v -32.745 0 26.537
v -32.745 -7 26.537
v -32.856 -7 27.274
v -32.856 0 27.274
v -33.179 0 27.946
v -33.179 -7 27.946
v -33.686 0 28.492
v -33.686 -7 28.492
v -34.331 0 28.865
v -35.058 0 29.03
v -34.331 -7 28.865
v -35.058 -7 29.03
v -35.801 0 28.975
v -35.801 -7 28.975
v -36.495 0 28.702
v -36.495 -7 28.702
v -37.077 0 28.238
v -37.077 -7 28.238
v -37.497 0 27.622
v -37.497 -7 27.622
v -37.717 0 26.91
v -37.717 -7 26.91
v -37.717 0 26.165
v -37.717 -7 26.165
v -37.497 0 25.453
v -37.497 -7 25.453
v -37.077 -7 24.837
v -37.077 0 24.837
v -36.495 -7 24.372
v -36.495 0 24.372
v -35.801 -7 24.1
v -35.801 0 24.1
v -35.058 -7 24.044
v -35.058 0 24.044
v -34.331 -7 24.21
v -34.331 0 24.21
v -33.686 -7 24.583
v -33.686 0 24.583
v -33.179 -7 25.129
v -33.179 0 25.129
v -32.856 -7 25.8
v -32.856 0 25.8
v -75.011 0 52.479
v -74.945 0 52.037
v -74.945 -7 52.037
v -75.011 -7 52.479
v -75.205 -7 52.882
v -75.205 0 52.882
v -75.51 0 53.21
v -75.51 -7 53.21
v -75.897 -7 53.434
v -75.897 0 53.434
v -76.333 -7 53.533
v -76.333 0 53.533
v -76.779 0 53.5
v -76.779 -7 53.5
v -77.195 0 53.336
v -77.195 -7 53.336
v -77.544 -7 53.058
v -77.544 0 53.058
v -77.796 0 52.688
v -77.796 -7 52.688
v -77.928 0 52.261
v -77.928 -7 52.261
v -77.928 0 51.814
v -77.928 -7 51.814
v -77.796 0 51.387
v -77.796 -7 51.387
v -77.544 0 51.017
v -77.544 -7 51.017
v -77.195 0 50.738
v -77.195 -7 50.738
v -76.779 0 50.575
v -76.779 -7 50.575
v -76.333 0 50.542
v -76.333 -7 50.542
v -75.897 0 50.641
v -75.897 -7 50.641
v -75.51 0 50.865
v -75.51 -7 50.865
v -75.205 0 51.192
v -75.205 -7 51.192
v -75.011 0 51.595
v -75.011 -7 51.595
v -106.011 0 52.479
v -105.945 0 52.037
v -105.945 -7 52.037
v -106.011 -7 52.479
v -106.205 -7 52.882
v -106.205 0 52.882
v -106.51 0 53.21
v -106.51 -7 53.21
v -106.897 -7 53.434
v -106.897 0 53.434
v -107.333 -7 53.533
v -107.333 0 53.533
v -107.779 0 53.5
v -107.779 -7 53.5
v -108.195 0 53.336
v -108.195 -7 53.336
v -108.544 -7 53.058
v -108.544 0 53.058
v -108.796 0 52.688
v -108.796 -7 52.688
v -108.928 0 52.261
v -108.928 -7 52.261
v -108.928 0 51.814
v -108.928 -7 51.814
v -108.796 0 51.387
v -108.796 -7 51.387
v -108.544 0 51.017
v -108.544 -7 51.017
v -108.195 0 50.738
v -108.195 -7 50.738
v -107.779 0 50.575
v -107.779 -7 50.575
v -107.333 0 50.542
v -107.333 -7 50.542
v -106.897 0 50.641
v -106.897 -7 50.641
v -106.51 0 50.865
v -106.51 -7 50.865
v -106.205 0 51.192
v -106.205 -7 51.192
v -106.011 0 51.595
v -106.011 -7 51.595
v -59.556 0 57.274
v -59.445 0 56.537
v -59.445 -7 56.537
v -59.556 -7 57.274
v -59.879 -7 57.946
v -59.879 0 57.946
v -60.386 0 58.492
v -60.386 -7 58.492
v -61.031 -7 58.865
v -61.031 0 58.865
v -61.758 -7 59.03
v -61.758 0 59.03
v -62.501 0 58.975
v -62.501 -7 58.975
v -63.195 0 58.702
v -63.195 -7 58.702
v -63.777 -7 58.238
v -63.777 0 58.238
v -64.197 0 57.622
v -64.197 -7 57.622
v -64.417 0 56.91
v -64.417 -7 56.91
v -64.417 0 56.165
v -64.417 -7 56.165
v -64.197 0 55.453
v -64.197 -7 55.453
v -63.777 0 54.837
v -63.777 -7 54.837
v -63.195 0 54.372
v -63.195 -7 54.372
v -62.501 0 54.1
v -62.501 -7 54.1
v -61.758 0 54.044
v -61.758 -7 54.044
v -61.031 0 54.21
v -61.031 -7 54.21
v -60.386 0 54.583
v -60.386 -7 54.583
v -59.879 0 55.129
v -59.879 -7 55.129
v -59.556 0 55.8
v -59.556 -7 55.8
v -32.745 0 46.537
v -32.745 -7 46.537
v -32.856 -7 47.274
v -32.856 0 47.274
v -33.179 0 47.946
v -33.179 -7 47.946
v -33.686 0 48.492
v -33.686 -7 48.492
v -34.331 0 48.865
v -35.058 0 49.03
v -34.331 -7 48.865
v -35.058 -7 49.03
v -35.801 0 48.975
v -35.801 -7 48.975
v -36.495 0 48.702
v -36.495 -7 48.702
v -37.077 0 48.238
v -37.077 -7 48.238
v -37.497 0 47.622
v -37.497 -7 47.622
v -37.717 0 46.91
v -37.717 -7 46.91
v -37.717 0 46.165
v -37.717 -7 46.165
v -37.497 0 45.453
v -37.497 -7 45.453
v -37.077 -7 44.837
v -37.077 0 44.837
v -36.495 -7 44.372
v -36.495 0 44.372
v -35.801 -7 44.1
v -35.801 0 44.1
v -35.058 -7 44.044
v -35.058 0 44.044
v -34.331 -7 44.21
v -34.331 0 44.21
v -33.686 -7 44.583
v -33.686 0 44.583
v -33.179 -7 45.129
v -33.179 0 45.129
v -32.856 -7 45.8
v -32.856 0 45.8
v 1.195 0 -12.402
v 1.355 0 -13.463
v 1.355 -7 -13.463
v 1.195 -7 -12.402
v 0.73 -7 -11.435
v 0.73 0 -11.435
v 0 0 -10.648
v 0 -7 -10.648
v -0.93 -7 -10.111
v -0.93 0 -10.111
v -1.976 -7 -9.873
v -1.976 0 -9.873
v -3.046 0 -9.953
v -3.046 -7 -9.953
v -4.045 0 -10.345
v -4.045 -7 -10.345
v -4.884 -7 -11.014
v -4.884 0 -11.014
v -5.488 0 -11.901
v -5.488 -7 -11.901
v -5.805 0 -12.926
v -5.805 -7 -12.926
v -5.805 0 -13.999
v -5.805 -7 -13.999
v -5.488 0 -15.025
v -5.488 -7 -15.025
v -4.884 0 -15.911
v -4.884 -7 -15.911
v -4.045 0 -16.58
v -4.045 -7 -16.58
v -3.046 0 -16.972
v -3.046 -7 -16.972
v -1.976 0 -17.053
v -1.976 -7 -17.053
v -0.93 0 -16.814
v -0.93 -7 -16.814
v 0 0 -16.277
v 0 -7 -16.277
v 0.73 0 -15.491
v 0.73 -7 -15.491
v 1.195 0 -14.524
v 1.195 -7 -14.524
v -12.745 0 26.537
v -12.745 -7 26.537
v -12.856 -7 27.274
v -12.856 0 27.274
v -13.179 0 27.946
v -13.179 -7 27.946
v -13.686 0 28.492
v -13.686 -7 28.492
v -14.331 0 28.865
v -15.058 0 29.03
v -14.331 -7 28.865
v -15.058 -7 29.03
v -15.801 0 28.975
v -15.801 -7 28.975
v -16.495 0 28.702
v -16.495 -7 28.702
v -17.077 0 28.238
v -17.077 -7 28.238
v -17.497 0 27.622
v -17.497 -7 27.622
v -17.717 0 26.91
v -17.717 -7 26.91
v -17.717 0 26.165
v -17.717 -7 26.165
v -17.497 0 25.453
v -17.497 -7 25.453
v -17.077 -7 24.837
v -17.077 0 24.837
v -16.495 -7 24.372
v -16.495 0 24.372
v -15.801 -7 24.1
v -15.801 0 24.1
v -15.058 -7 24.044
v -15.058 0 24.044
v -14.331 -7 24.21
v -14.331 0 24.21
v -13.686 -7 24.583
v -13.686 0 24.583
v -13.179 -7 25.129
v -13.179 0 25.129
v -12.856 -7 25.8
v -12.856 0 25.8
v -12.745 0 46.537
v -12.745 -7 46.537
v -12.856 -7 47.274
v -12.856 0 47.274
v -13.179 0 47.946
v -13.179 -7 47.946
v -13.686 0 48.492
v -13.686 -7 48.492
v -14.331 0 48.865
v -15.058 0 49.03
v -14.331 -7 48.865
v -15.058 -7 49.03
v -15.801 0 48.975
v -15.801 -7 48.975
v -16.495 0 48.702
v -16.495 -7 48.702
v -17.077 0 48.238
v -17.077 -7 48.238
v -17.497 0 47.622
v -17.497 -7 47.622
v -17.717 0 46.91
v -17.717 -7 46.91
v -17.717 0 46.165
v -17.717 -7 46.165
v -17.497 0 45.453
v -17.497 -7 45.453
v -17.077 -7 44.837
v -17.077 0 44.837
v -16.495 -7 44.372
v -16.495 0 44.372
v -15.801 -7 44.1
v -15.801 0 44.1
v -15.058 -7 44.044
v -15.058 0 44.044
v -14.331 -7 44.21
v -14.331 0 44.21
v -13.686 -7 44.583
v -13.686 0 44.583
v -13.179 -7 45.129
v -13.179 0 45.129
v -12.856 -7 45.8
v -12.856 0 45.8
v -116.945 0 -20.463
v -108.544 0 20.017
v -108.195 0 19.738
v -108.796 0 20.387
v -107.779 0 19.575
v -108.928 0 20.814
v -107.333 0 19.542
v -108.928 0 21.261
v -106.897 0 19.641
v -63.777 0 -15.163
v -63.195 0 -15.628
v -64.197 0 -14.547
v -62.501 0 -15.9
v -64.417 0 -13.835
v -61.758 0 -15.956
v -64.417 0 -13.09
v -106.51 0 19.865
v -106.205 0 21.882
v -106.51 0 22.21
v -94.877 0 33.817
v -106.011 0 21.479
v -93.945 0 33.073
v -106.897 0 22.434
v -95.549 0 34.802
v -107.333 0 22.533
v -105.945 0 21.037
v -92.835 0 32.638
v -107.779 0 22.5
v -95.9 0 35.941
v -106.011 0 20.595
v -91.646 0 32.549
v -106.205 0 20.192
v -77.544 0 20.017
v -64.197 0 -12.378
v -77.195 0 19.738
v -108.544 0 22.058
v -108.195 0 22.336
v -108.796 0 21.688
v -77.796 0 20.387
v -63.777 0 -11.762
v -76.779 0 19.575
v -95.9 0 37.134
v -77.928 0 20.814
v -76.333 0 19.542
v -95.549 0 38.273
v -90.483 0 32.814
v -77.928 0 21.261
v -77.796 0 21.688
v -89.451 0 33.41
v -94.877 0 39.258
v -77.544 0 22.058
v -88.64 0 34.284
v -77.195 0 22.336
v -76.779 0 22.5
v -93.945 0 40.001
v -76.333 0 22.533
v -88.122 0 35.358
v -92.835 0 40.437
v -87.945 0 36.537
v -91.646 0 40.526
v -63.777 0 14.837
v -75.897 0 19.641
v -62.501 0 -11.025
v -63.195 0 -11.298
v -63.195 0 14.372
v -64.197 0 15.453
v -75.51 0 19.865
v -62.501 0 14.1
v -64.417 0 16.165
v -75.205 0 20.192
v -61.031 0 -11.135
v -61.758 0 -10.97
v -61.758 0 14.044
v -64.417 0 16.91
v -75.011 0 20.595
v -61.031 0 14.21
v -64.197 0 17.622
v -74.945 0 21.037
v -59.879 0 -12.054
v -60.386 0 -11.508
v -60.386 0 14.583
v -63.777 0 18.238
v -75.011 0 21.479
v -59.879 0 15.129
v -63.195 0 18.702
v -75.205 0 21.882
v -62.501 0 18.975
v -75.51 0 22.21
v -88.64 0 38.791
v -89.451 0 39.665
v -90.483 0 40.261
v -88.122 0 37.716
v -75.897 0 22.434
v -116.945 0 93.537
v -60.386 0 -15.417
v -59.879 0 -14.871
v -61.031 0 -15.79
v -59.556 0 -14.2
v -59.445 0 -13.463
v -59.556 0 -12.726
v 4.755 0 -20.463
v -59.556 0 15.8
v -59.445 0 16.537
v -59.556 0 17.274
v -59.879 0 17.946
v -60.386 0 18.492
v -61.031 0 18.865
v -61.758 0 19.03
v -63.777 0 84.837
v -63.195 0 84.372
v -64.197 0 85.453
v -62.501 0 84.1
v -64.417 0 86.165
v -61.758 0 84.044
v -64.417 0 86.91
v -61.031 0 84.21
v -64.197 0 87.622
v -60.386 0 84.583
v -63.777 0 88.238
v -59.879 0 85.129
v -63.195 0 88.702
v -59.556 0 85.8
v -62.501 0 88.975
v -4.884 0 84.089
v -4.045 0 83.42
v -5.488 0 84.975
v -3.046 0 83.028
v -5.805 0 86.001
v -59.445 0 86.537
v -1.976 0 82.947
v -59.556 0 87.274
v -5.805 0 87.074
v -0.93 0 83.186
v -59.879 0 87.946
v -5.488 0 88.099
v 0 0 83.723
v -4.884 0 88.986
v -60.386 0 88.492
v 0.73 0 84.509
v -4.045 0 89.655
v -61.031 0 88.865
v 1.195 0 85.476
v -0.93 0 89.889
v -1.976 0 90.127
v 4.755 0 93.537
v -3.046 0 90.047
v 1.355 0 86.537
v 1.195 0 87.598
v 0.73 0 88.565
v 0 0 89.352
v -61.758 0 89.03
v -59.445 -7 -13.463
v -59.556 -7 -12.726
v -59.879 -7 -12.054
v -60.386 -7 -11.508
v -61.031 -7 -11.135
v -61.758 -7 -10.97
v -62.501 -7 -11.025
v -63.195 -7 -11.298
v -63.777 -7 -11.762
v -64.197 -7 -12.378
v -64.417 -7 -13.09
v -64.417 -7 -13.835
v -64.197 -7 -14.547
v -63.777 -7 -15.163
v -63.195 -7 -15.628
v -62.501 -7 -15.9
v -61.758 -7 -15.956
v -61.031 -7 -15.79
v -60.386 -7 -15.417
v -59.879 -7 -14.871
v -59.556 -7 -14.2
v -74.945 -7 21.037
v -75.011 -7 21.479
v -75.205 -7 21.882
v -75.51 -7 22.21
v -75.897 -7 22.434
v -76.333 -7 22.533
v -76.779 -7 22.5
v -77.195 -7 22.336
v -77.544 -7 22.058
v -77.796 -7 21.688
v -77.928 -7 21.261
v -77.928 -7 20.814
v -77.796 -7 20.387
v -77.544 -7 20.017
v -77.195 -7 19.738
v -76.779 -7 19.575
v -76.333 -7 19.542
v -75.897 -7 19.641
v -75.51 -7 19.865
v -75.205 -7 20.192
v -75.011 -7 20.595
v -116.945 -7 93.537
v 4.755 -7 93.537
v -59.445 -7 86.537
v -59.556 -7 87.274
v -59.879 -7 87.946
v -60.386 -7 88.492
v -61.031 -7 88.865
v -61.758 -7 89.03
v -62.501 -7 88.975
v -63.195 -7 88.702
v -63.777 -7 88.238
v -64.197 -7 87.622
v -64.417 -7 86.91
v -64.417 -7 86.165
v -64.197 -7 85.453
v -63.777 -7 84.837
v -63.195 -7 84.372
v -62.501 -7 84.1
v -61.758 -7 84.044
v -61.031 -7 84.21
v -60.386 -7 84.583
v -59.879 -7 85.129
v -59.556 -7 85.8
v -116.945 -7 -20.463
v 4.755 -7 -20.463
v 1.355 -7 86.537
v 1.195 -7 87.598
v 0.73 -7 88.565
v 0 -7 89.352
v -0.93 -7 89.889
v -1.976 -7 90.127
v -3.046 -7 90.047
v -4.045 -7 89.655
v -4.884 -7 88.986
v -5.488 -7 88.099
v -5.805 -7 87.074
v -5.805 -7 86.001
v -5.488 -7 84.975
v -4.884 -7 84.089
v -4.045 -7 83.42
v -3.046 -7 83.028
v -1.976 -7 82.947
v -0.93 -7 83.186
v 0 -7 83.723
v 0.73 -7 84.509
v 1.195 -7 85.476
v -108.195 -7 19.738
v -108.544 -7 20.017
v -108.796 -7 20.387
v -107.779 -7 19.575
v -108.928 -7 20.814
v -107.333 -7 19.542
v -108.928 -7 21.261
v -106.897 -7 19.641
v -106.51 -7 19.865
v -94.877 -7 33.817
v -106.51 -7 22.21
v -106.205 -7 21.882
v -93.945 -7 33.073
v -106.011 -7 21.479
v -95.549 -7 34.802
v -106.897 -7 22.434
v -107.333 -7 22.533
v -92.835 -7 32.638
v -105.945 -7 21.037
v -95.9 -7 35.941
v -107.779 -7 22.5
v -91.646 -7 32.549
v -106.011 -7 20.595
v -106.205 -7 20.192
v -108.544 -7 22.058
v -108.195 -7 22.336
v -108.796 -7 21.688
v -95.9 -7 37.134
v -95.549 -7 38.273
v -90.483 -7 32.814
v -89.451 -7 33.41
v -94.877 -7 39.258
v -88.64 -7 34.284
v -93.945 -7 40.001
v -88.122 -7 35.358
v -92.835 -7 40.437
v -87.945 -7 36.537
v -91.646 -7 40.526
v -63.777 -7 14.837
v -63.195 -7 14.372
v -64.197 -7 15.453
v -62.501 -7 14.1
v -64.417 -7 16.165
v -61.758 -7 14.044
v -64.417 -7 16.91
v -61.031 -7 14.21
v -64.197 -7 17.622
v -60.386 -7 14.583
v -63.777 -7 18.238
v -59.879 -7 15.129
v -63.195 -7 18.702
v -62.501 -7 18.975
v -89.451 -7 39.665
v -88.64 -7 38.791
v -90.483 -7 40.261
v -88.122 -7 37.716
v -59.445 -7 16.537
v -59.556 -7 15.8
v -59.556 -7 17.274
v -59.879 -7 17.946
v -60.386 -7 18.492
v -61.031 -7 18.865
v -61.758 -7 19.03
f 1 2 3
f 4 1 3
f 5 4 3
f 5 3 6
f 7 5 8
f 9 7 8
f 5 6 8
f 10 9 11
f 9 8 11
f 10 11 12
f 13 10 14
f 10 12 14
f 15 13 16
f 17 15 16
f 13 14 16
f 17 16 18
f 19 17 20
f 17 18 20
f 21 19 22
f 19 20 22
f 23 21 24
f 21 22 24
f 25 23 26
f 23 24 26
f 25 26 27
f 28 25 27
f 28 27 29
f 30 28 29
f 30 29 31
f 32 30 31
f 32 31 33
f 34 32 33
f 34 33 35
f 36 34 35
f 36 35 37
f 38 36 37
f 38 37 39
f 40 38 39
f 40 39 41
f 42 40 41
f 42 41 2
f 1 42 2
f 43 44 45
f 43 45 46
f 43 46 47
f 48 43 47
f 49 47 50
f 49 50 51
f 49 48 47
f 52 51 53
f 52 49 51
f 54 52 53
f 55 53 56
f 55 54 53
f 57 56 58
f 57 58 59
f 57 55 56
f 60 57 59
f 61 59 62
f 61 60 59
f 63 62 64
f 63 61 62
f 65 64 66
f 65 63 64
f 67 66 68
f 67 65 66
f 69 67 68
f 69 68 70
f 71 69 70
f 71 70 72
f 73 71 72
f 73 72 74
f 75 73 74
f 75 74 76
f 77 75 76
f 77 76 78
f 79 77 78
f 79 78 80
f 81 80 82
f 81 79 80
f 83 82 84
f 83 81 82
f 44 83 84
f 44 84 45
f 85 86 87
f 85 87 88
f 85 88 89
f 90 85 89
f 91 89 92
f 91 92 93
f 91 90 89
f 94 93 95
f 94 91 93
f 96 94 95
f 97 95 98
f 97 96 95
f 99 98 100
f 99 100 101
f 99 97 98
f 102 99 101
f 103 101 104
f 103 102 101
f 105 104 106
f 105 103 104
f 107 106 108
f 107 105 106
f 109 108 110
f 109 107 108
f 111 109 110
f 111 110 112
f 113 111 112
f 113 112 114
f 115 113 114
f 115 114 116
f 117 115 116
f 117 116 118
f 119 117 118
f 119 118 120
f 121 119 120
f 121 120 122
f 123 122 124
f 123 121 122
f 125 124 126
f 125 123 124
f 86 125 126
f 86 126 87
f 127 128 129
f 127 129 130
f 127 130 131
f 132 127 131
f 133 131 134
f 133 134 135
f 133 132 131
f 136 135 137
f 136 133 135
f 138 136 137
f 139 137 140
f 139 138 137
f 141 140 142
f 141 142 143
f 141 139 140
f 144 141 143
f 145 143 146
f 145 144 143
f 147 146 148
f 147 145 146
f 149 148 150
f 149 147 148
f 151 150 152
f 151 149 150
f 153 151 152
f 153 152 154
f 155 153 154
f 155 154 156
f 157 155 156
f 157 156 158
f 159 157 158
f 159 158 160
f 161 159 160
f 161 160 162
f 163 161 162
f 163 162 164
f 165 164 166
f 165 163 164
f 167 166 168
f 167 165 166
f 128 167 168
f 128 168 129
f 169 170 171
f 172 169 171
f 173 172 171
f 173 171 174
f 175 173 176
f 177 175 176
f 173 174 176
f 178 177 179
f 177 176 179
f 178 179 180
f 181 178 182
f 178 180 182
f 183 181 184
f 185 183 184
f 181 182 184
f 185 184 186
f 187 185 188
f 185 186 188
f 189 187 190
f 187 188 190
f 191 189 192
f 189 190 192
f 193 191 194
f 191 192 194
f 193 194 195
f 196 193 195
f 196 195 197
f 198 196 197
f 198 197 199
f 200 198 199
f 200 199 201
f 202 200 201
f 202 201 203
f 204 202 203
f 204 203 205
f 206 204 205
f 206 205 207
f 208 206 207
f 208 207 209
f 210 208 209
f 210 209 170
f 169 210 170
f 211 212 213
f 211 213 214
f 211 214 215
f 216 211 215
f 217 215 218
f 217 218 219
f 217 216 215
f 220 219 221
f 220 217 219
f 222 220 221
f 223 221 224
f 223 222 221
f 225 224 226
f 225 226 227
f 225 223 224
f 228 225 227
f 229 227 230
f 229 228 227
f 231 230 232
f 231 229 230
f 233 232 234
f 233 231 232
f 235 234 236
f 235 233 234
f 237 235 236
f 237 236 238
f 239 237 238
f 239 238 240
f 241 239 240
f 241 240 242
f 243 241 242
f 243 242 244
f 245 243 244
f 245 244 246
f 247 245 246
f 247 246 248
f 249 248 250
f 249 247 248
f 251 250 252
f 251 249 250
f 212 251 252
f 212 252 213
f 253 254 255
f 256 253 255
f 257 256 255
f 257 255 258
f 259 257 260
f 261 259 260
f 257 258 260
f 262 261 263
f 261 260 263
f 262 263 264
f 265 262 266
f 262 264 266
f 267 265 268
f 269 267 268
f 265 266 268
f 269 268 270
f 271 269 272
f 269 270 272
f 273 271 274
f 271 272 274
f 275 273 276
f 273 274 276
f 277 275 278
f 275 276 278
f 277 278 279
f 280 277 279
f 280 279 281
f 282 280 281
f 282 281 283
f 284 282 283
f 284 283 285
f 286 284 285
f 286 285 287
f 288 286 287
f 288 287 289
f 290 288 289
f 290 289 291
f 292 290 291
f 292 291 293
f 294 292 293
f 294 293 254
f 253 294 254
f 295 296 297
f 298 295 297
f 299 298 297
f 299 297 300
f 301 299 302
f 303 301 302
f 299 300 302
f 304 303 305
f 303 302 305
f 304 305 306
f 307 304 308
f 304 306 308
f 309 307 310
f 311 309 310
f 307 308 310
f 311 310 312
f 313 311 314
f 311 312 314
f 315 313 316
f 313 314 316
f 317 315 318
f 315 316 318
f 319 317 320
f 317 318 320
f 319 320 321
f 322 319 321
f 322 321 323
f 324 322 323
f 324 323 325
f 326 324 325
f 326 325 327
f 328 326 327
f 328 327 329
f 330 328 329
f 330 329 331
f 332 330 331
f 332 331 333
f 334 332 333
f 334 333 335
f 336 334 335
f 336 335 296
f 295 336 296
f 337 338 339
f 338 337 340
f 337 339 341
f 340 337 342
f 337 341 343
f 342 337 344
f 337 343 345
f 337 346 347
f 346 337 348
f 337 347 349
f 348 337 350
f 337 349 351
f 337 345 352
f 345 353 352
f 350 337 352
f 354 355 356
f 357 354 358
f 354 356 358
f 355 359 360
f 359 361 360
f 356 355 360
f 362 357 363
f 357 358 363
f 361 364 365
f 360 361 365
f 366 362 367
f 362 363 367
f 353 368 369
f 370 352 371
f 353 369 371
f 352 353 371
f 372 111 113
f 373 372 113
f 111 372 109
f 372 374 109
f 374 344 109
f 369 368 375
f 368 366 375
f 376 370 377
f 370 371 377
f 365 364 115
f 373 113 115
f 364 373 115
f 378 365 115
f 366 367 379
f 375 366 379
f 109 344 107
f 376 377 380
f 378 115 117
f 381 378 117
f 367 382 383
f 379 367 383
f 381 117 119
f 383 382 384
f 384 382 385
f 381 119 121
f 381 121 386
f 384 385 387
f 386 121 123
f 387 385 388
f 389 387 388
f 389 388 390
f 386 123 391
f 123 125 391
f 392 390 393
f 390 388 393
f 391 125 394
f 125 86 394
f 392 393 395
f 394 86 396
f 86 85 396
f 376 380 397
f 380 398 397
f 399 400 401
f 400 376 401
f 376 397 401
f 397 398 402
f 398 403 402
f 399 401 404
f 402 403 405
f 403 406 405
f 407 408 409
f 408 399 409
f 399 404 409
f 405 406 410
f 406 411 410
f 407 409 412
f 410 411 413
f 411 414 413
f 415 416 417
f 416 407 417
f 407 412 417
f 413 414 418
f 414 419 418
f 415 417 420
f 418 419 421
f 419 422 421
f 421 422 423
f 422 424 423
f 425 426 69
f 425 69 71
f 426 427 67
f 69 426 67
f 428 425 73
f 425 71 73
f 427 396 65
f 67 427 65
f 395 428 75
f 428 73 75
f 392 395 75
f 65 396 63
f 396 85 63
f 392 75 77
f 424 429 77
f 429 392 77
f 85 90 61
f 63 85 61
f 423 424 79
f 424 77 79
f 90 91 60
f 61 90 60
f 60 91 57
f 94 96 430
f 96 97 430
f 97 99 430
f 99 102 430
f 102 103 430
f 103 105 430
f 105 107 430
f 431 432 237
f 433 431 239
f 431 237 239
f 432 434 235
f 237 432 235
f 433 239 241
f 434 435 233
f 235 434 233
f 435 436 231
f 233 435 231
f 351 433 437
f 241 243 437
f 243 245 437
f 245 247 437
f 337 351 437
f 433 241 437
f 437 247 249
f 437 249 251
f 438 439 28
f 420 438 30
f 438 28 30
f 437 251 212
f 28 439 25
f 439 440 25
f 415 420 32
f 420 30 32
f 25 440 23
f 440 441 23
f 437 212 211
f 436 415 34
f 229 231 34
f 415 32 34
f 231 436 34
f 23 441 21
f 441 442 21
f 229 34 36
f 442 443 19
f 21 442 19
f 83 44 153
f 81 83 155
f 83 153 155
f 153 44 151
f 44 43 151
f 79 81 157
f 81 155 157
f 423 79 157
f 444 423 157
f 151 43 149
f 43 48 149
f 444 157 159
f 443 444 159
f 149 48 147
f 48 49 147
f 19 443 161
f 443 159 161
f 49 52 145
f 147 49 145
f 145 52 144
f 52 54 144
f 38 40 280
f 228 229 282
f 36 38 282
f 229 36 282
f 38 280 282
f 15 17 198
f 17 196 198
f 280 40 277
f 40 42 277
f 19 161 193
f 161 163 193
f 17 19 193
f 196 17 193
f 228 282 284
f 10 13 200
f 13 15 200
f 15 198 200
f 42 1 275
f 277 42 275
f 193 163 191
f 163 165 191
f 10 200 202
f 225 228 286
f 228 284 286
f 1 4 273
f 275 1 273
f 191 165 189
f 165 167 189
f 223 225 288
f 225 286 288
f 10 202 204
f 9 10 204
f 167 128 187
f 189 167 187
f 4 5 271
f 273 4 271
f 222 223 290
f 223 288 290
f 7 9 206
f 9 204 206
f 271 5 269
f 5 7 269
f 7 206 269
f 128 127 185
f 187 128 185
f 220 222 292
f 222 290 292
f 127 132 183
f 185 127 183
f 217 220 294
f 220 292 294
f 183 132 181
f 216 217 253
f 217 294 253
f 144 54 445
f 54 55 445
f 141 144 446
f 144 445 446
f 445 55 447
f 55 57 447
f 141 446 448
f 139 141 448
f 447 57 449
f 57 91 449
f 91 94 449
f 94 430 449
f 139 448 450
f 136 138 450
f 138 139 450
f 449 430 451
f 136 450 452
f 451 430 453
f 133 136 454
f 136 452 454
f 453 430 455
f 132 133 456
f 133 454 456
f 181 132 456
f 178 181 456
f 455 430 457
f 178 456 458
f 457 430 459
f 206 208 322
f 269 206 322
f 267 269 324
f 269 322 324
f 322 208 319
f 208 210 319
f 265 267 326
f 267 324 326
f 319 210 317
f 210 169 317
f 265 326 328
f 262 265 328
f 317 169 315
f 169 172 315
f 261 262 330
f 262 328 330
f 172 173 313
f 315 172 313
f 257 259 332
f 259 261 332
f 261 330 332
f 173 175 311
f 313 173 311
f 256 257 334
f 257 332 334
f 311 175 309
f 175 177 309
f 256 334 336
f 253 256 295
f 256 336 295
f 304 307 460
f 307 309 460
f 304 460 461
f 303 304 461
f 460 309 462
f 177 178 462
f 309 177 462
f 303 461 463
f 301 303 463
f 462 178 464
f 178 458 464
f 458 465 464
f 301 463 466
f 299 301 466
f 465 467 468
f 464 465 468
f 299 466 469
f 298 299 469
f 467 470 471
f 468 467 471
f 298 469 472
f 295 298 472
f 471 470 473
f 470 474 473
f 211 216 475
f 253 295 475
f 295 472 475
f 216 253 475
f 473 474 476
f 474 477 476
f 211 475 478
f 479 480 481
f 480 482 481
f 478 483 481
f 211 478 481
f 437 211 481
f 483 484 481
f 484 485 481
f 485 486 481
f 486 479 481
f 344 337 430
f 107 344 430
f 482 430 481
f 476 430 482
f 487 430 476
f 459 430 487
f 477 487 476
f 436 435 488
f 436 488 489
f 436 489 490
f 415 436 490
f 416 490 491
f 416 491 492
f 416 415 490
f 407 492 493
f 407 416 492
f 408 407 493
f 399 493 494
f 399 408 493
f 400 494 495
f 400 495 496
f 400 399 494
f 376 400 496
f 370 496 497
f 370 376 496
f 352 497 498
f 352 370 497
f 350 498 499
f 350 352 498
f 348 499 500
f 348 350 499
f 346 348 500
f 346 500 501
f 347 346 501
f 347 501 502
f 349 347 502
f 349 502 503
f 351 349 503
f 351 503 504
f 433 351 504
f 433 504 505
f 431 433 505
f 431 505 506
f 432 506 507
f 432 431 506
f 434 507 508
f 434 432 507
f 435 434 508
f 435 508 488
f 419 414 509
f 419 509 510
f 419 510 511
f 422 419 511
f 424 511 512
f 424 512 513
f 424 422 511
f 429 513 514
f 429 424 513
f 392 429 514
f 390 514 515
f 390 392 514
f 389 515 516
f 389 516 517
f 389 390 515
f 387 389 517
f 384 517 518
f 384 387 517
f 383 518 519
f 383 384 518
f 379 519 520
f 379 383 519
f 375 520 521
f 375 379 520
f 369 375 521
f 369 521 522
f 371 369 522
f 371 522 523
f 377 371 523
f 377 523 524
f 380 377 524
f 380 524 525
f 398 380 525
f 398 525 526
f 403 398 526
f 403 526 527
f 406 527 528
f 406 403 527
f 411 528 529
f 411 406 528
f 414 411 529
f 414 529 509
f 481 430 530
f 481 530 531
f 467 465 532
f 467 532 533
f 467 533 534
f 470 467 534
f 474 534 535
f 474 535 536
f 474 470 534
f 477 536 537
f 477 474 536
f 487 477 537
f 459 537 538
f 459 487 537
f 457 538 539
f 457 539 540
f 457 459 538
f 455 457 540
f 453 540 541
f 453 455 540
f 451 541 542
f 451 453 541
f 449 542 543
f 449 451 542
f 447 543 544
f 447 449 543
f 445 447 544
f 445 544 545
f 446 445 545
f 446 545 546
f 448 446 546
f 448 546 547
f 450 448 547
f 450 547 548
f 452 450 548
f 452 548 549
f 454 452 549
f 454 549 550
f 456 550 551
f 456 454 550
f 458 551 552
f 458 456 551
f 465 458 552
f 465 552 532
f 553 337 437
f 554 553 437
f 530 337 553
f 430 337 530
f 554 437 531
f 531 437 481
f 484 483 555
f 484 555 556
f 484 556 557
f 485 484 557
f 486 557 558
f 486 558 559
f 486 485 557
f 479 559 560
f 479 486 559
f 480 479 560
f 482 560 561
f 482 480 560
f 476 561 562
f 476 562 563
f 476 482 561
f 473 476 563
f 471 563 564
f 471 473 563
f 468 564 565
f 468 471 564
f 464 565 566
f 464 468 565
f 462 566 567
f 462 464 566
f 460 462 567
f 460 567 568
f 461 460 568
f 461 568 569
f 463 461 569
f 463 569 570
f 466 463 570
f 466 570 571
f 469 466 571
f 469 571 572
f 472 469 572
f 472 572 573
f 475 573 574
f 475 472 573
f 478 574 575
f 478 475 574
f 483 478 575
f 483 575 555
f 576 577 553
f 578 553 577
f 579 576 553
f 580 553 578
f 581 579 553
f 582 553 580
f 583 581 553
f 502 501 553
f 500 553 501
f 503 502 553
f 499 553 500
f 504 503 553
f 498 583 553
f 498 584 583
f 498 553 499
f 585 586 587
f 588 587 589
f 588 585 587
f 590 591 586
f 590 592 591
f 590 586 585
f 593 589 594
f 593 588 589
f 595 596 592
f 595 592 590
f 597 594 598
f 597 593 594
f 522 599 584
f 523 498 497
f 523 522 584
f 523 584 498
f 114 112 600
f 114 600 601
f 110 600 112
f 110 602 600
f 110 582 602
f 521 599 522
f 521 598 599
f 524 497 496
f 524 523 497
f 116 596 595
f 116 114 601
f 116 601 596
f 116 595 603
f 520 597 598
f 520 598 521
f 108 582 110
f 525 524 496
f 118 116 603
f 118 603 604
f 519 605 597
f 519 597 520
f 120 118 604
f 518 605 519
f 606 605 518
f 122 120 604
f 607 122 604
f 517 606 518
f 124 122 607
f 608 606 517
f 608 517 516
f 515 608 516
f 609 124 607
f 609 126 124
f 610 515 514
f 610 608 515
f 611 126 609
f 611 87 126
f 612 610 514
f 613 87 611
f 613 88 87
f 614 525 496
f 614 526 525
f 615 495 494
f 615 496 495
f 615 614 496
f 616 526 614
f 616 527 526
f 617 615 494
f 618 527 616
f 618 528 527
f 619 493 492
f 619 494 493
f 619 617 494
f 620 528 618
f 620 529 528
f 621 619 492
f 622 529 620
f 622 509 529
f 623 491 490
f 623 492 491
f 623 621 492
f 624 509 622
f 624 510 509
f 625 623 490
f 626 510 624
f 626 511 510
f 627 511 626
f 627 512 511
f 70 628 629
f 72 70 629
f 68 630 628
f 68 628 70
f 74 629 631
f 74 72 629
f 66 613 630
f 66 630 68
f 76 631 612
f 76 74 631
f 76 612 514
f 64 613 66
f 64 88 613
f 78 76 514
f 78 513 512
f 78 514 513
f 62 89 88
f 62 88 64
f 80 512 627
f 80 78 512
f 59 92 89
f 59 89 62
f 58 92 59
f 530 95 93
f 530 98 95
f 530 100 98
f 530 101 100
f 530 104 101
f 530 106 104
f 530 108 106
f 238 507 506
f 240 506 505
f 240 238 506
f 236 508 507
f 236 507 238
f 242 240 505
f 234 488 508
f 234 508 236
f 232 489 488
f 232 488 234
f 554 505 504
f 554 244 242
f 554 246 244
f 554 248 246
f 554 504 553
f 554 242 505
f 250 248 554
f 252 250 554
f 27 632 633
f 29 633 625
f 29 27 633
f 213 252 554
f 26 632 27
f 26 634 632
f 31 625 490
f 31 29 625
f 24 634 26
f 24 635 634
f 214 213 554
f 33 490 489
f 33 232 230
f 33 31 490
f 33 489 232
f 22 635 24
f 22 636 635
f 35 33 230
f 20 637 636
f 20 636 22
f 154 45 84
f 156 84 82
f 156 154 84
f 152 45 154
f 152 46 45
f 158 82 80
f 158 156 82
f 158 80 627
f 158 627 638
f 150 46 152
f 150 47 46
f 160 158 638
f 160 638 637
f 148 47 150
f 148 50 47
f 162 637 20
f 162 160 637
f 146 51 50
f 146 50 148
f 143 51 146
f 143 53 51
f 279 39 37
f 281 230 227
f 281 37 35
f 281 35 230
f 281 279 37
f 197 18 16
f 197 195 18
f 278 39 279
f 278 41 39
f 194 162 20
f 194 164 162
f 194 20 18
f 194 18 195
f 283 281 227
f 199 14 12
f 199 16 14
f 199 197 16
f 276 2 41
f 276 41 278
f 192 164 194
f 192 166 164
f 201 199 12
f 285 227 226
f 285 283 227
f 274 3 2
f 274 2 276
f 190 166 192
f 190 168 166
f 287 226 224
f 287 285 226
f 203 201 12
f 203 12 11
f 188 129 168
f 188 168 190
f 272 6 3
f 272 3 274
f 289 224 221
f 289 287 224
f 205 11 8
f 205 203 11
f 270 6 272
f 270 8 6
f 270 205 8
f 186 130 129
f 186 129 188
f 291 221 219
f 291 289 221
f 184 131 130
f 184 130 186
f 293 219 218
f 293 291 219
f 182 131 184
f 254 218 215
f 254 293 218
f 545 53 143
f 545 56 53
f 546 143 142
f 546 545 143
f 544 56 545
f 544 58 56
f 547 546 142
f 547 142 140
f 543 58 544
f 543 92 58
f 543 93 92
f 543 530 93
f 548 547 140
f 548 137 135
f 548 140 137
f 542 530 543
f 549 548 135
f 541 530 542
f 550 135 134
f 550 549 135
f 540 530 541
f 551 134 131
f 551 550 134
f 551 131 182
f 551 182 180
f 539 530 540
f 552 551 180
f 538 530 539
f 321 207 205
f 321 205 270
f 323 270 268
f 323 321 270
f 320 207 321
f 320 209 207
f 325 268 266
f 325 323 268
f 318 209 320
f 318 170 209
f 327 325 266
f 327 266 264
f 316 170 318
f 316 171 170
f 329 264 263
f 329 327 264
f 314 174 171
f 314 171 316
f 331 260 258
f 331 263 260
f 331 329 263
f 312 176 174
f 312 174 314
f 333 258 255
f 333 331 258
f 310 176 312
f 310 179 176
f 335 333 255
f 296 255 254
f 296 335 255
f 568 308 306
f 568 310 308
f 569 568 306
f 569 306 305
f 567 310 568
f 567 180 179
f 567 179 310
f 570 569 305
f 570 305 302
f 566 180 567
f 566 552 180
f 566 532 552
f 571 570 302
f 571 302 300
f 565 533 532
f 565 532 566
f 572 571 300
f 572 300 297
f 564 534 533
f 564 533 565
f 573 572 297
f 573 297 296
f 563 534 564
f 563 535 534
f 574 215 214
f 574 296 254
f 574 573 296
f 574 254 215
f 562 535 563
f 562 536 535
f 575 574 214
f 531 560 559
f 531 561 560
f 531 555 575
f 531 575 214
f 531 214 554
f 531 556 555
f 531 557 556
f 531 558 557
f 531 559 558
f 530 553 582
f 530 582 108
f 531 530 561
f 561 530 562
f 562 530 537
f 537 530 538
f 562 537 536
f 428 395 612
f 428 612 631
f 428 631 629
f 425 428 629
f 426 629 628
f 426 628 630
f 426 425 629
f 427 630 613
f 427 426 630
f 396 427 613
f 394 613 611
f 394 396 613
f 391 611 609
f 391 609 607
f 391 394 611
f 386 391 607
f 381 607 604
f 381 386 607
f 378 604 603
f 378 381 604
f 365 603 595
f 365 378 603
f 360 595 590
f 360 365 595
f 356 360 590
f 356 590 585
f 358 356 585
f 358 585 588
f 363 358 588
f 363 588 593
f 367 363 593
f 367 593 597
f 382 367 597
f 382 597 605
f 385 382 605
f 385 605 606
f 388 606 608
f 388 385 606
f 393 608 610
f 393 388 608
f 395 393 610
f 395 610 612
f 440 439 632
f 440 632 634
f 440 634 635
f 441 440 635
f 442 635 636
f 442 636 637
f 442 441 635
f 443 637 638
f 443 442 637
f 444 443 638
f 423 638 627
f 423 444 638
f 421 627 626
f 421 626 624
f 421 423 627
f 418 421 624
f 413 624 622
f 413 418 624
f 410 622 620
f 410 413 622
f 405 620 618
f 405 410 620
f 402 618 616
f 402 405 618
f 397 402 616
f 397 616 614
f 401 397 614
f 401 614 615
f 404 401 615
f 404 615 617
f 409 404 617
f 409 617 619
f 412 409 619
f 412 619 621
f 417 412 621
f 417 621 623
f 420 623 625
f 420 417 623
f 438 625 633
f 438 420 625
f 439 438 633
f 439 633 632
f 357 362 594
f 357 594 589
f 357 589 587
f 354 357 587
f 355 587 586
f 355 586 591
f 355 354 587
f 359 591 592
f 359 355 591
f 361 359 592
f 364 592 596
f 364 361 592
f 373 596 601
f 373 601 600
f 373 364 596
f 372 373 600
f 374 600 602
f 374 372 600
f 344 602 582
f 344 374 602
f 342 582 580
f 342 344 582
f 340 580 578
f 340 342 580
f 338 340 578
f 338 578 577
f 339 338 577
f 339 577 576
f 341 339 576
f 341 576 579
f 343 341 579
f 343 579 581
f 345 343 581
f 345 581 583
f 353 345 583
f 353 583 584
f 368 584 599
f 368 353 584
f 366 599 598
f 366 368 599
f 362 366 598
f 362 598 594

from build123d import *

# Parameters (mm, degrees)
F0_W     = 121.7
F0_H     = 114
F0_R     = 2.5
F0_R_2   = 1.5
F0_R_3   = 11
F0_R_4   = 3.6
F0_R_5   = 4
F1_DEPTH = 7
F2_R     = 2.5
F3_DEPTH = 25


with BuildPart() as f1:
    # F0 (on Front) → F1 (new body)
    with BuildSketch(Plane.XZ):
        with Locations((-56.094777, 36.537357)):
            Rectangle(F0_W, F0_H)
        with Locations((-61.944777, -13.462643)):
            Circle(F0_R, mode=Mode.SUBTRACT)
        with Locations((-107.444777, 21.037357)):
            Circle(F0_R_2, mode=Mode.SUBTRACT)
        with Locations((-91.944777, 36.537357)):
            Circle(F0_R_3, mode=Mode.SUBTRACT)
        with Locations((-76.444777, 21.037357)):
            Circle(F0_R_2, mode=Mode.SUBTRACT)
        with Locations((-61.944777, 16.537357)):
            Circle(F0_R, mode=Mode.SUBTRACT)
        with Locations((-2.244777, -13.462643)):
            Circle(F0_R_4, mode=Mode.SUBTRACT)
        with Locations((-107.444777, 52.037357)):
            Circle(F0_R_2, mode=Mode.SUBTRACT)
        with Locations((-76.444777, 52.037357)):
            Circle(F0_R_2, mode=Mode.SUBTRACT)
        with Locations((-61.944777, 56.537357)):
            Circle(F0_R, mode=Mode.SUBTRACT)
        with Locations((-61.944777, 86.537357)):
            Circle(F0_R, mode=Mode.SUBTRACT)
        with Locations((-2.244777, 86.537357)):
            Circle(F0_R_4, mode=Mode.SUBTRACT)
        with Locations((-91.944777, 36.537357)):
            Circle(F0_R_3)
        with Locations((-91.944777, 36.537357)):
            Circle(F0_R_5, mode=Mode.SUBTRACT)
    extrude(amount=F1_DEPTH)

    # F2 (on face) → F3 (cut)
    with BuildSketch(Plane.XZ.offset(7)):
        with Locations((-35.244777, 46.537357)):
            Circle(F2_R)
        with Locations((-15.244777, 46.537357)):
            Circle(F2_R)
        with Locations((-35.244777, 26.537357)):
            Circle(F2_R)
        with Locations((-15.244777, 26.537357)):
            Circle(F2_R)
    extrude(amount=-F3_DEPTH, mode=Mode.SUBTRACT)


solid = f1.part
